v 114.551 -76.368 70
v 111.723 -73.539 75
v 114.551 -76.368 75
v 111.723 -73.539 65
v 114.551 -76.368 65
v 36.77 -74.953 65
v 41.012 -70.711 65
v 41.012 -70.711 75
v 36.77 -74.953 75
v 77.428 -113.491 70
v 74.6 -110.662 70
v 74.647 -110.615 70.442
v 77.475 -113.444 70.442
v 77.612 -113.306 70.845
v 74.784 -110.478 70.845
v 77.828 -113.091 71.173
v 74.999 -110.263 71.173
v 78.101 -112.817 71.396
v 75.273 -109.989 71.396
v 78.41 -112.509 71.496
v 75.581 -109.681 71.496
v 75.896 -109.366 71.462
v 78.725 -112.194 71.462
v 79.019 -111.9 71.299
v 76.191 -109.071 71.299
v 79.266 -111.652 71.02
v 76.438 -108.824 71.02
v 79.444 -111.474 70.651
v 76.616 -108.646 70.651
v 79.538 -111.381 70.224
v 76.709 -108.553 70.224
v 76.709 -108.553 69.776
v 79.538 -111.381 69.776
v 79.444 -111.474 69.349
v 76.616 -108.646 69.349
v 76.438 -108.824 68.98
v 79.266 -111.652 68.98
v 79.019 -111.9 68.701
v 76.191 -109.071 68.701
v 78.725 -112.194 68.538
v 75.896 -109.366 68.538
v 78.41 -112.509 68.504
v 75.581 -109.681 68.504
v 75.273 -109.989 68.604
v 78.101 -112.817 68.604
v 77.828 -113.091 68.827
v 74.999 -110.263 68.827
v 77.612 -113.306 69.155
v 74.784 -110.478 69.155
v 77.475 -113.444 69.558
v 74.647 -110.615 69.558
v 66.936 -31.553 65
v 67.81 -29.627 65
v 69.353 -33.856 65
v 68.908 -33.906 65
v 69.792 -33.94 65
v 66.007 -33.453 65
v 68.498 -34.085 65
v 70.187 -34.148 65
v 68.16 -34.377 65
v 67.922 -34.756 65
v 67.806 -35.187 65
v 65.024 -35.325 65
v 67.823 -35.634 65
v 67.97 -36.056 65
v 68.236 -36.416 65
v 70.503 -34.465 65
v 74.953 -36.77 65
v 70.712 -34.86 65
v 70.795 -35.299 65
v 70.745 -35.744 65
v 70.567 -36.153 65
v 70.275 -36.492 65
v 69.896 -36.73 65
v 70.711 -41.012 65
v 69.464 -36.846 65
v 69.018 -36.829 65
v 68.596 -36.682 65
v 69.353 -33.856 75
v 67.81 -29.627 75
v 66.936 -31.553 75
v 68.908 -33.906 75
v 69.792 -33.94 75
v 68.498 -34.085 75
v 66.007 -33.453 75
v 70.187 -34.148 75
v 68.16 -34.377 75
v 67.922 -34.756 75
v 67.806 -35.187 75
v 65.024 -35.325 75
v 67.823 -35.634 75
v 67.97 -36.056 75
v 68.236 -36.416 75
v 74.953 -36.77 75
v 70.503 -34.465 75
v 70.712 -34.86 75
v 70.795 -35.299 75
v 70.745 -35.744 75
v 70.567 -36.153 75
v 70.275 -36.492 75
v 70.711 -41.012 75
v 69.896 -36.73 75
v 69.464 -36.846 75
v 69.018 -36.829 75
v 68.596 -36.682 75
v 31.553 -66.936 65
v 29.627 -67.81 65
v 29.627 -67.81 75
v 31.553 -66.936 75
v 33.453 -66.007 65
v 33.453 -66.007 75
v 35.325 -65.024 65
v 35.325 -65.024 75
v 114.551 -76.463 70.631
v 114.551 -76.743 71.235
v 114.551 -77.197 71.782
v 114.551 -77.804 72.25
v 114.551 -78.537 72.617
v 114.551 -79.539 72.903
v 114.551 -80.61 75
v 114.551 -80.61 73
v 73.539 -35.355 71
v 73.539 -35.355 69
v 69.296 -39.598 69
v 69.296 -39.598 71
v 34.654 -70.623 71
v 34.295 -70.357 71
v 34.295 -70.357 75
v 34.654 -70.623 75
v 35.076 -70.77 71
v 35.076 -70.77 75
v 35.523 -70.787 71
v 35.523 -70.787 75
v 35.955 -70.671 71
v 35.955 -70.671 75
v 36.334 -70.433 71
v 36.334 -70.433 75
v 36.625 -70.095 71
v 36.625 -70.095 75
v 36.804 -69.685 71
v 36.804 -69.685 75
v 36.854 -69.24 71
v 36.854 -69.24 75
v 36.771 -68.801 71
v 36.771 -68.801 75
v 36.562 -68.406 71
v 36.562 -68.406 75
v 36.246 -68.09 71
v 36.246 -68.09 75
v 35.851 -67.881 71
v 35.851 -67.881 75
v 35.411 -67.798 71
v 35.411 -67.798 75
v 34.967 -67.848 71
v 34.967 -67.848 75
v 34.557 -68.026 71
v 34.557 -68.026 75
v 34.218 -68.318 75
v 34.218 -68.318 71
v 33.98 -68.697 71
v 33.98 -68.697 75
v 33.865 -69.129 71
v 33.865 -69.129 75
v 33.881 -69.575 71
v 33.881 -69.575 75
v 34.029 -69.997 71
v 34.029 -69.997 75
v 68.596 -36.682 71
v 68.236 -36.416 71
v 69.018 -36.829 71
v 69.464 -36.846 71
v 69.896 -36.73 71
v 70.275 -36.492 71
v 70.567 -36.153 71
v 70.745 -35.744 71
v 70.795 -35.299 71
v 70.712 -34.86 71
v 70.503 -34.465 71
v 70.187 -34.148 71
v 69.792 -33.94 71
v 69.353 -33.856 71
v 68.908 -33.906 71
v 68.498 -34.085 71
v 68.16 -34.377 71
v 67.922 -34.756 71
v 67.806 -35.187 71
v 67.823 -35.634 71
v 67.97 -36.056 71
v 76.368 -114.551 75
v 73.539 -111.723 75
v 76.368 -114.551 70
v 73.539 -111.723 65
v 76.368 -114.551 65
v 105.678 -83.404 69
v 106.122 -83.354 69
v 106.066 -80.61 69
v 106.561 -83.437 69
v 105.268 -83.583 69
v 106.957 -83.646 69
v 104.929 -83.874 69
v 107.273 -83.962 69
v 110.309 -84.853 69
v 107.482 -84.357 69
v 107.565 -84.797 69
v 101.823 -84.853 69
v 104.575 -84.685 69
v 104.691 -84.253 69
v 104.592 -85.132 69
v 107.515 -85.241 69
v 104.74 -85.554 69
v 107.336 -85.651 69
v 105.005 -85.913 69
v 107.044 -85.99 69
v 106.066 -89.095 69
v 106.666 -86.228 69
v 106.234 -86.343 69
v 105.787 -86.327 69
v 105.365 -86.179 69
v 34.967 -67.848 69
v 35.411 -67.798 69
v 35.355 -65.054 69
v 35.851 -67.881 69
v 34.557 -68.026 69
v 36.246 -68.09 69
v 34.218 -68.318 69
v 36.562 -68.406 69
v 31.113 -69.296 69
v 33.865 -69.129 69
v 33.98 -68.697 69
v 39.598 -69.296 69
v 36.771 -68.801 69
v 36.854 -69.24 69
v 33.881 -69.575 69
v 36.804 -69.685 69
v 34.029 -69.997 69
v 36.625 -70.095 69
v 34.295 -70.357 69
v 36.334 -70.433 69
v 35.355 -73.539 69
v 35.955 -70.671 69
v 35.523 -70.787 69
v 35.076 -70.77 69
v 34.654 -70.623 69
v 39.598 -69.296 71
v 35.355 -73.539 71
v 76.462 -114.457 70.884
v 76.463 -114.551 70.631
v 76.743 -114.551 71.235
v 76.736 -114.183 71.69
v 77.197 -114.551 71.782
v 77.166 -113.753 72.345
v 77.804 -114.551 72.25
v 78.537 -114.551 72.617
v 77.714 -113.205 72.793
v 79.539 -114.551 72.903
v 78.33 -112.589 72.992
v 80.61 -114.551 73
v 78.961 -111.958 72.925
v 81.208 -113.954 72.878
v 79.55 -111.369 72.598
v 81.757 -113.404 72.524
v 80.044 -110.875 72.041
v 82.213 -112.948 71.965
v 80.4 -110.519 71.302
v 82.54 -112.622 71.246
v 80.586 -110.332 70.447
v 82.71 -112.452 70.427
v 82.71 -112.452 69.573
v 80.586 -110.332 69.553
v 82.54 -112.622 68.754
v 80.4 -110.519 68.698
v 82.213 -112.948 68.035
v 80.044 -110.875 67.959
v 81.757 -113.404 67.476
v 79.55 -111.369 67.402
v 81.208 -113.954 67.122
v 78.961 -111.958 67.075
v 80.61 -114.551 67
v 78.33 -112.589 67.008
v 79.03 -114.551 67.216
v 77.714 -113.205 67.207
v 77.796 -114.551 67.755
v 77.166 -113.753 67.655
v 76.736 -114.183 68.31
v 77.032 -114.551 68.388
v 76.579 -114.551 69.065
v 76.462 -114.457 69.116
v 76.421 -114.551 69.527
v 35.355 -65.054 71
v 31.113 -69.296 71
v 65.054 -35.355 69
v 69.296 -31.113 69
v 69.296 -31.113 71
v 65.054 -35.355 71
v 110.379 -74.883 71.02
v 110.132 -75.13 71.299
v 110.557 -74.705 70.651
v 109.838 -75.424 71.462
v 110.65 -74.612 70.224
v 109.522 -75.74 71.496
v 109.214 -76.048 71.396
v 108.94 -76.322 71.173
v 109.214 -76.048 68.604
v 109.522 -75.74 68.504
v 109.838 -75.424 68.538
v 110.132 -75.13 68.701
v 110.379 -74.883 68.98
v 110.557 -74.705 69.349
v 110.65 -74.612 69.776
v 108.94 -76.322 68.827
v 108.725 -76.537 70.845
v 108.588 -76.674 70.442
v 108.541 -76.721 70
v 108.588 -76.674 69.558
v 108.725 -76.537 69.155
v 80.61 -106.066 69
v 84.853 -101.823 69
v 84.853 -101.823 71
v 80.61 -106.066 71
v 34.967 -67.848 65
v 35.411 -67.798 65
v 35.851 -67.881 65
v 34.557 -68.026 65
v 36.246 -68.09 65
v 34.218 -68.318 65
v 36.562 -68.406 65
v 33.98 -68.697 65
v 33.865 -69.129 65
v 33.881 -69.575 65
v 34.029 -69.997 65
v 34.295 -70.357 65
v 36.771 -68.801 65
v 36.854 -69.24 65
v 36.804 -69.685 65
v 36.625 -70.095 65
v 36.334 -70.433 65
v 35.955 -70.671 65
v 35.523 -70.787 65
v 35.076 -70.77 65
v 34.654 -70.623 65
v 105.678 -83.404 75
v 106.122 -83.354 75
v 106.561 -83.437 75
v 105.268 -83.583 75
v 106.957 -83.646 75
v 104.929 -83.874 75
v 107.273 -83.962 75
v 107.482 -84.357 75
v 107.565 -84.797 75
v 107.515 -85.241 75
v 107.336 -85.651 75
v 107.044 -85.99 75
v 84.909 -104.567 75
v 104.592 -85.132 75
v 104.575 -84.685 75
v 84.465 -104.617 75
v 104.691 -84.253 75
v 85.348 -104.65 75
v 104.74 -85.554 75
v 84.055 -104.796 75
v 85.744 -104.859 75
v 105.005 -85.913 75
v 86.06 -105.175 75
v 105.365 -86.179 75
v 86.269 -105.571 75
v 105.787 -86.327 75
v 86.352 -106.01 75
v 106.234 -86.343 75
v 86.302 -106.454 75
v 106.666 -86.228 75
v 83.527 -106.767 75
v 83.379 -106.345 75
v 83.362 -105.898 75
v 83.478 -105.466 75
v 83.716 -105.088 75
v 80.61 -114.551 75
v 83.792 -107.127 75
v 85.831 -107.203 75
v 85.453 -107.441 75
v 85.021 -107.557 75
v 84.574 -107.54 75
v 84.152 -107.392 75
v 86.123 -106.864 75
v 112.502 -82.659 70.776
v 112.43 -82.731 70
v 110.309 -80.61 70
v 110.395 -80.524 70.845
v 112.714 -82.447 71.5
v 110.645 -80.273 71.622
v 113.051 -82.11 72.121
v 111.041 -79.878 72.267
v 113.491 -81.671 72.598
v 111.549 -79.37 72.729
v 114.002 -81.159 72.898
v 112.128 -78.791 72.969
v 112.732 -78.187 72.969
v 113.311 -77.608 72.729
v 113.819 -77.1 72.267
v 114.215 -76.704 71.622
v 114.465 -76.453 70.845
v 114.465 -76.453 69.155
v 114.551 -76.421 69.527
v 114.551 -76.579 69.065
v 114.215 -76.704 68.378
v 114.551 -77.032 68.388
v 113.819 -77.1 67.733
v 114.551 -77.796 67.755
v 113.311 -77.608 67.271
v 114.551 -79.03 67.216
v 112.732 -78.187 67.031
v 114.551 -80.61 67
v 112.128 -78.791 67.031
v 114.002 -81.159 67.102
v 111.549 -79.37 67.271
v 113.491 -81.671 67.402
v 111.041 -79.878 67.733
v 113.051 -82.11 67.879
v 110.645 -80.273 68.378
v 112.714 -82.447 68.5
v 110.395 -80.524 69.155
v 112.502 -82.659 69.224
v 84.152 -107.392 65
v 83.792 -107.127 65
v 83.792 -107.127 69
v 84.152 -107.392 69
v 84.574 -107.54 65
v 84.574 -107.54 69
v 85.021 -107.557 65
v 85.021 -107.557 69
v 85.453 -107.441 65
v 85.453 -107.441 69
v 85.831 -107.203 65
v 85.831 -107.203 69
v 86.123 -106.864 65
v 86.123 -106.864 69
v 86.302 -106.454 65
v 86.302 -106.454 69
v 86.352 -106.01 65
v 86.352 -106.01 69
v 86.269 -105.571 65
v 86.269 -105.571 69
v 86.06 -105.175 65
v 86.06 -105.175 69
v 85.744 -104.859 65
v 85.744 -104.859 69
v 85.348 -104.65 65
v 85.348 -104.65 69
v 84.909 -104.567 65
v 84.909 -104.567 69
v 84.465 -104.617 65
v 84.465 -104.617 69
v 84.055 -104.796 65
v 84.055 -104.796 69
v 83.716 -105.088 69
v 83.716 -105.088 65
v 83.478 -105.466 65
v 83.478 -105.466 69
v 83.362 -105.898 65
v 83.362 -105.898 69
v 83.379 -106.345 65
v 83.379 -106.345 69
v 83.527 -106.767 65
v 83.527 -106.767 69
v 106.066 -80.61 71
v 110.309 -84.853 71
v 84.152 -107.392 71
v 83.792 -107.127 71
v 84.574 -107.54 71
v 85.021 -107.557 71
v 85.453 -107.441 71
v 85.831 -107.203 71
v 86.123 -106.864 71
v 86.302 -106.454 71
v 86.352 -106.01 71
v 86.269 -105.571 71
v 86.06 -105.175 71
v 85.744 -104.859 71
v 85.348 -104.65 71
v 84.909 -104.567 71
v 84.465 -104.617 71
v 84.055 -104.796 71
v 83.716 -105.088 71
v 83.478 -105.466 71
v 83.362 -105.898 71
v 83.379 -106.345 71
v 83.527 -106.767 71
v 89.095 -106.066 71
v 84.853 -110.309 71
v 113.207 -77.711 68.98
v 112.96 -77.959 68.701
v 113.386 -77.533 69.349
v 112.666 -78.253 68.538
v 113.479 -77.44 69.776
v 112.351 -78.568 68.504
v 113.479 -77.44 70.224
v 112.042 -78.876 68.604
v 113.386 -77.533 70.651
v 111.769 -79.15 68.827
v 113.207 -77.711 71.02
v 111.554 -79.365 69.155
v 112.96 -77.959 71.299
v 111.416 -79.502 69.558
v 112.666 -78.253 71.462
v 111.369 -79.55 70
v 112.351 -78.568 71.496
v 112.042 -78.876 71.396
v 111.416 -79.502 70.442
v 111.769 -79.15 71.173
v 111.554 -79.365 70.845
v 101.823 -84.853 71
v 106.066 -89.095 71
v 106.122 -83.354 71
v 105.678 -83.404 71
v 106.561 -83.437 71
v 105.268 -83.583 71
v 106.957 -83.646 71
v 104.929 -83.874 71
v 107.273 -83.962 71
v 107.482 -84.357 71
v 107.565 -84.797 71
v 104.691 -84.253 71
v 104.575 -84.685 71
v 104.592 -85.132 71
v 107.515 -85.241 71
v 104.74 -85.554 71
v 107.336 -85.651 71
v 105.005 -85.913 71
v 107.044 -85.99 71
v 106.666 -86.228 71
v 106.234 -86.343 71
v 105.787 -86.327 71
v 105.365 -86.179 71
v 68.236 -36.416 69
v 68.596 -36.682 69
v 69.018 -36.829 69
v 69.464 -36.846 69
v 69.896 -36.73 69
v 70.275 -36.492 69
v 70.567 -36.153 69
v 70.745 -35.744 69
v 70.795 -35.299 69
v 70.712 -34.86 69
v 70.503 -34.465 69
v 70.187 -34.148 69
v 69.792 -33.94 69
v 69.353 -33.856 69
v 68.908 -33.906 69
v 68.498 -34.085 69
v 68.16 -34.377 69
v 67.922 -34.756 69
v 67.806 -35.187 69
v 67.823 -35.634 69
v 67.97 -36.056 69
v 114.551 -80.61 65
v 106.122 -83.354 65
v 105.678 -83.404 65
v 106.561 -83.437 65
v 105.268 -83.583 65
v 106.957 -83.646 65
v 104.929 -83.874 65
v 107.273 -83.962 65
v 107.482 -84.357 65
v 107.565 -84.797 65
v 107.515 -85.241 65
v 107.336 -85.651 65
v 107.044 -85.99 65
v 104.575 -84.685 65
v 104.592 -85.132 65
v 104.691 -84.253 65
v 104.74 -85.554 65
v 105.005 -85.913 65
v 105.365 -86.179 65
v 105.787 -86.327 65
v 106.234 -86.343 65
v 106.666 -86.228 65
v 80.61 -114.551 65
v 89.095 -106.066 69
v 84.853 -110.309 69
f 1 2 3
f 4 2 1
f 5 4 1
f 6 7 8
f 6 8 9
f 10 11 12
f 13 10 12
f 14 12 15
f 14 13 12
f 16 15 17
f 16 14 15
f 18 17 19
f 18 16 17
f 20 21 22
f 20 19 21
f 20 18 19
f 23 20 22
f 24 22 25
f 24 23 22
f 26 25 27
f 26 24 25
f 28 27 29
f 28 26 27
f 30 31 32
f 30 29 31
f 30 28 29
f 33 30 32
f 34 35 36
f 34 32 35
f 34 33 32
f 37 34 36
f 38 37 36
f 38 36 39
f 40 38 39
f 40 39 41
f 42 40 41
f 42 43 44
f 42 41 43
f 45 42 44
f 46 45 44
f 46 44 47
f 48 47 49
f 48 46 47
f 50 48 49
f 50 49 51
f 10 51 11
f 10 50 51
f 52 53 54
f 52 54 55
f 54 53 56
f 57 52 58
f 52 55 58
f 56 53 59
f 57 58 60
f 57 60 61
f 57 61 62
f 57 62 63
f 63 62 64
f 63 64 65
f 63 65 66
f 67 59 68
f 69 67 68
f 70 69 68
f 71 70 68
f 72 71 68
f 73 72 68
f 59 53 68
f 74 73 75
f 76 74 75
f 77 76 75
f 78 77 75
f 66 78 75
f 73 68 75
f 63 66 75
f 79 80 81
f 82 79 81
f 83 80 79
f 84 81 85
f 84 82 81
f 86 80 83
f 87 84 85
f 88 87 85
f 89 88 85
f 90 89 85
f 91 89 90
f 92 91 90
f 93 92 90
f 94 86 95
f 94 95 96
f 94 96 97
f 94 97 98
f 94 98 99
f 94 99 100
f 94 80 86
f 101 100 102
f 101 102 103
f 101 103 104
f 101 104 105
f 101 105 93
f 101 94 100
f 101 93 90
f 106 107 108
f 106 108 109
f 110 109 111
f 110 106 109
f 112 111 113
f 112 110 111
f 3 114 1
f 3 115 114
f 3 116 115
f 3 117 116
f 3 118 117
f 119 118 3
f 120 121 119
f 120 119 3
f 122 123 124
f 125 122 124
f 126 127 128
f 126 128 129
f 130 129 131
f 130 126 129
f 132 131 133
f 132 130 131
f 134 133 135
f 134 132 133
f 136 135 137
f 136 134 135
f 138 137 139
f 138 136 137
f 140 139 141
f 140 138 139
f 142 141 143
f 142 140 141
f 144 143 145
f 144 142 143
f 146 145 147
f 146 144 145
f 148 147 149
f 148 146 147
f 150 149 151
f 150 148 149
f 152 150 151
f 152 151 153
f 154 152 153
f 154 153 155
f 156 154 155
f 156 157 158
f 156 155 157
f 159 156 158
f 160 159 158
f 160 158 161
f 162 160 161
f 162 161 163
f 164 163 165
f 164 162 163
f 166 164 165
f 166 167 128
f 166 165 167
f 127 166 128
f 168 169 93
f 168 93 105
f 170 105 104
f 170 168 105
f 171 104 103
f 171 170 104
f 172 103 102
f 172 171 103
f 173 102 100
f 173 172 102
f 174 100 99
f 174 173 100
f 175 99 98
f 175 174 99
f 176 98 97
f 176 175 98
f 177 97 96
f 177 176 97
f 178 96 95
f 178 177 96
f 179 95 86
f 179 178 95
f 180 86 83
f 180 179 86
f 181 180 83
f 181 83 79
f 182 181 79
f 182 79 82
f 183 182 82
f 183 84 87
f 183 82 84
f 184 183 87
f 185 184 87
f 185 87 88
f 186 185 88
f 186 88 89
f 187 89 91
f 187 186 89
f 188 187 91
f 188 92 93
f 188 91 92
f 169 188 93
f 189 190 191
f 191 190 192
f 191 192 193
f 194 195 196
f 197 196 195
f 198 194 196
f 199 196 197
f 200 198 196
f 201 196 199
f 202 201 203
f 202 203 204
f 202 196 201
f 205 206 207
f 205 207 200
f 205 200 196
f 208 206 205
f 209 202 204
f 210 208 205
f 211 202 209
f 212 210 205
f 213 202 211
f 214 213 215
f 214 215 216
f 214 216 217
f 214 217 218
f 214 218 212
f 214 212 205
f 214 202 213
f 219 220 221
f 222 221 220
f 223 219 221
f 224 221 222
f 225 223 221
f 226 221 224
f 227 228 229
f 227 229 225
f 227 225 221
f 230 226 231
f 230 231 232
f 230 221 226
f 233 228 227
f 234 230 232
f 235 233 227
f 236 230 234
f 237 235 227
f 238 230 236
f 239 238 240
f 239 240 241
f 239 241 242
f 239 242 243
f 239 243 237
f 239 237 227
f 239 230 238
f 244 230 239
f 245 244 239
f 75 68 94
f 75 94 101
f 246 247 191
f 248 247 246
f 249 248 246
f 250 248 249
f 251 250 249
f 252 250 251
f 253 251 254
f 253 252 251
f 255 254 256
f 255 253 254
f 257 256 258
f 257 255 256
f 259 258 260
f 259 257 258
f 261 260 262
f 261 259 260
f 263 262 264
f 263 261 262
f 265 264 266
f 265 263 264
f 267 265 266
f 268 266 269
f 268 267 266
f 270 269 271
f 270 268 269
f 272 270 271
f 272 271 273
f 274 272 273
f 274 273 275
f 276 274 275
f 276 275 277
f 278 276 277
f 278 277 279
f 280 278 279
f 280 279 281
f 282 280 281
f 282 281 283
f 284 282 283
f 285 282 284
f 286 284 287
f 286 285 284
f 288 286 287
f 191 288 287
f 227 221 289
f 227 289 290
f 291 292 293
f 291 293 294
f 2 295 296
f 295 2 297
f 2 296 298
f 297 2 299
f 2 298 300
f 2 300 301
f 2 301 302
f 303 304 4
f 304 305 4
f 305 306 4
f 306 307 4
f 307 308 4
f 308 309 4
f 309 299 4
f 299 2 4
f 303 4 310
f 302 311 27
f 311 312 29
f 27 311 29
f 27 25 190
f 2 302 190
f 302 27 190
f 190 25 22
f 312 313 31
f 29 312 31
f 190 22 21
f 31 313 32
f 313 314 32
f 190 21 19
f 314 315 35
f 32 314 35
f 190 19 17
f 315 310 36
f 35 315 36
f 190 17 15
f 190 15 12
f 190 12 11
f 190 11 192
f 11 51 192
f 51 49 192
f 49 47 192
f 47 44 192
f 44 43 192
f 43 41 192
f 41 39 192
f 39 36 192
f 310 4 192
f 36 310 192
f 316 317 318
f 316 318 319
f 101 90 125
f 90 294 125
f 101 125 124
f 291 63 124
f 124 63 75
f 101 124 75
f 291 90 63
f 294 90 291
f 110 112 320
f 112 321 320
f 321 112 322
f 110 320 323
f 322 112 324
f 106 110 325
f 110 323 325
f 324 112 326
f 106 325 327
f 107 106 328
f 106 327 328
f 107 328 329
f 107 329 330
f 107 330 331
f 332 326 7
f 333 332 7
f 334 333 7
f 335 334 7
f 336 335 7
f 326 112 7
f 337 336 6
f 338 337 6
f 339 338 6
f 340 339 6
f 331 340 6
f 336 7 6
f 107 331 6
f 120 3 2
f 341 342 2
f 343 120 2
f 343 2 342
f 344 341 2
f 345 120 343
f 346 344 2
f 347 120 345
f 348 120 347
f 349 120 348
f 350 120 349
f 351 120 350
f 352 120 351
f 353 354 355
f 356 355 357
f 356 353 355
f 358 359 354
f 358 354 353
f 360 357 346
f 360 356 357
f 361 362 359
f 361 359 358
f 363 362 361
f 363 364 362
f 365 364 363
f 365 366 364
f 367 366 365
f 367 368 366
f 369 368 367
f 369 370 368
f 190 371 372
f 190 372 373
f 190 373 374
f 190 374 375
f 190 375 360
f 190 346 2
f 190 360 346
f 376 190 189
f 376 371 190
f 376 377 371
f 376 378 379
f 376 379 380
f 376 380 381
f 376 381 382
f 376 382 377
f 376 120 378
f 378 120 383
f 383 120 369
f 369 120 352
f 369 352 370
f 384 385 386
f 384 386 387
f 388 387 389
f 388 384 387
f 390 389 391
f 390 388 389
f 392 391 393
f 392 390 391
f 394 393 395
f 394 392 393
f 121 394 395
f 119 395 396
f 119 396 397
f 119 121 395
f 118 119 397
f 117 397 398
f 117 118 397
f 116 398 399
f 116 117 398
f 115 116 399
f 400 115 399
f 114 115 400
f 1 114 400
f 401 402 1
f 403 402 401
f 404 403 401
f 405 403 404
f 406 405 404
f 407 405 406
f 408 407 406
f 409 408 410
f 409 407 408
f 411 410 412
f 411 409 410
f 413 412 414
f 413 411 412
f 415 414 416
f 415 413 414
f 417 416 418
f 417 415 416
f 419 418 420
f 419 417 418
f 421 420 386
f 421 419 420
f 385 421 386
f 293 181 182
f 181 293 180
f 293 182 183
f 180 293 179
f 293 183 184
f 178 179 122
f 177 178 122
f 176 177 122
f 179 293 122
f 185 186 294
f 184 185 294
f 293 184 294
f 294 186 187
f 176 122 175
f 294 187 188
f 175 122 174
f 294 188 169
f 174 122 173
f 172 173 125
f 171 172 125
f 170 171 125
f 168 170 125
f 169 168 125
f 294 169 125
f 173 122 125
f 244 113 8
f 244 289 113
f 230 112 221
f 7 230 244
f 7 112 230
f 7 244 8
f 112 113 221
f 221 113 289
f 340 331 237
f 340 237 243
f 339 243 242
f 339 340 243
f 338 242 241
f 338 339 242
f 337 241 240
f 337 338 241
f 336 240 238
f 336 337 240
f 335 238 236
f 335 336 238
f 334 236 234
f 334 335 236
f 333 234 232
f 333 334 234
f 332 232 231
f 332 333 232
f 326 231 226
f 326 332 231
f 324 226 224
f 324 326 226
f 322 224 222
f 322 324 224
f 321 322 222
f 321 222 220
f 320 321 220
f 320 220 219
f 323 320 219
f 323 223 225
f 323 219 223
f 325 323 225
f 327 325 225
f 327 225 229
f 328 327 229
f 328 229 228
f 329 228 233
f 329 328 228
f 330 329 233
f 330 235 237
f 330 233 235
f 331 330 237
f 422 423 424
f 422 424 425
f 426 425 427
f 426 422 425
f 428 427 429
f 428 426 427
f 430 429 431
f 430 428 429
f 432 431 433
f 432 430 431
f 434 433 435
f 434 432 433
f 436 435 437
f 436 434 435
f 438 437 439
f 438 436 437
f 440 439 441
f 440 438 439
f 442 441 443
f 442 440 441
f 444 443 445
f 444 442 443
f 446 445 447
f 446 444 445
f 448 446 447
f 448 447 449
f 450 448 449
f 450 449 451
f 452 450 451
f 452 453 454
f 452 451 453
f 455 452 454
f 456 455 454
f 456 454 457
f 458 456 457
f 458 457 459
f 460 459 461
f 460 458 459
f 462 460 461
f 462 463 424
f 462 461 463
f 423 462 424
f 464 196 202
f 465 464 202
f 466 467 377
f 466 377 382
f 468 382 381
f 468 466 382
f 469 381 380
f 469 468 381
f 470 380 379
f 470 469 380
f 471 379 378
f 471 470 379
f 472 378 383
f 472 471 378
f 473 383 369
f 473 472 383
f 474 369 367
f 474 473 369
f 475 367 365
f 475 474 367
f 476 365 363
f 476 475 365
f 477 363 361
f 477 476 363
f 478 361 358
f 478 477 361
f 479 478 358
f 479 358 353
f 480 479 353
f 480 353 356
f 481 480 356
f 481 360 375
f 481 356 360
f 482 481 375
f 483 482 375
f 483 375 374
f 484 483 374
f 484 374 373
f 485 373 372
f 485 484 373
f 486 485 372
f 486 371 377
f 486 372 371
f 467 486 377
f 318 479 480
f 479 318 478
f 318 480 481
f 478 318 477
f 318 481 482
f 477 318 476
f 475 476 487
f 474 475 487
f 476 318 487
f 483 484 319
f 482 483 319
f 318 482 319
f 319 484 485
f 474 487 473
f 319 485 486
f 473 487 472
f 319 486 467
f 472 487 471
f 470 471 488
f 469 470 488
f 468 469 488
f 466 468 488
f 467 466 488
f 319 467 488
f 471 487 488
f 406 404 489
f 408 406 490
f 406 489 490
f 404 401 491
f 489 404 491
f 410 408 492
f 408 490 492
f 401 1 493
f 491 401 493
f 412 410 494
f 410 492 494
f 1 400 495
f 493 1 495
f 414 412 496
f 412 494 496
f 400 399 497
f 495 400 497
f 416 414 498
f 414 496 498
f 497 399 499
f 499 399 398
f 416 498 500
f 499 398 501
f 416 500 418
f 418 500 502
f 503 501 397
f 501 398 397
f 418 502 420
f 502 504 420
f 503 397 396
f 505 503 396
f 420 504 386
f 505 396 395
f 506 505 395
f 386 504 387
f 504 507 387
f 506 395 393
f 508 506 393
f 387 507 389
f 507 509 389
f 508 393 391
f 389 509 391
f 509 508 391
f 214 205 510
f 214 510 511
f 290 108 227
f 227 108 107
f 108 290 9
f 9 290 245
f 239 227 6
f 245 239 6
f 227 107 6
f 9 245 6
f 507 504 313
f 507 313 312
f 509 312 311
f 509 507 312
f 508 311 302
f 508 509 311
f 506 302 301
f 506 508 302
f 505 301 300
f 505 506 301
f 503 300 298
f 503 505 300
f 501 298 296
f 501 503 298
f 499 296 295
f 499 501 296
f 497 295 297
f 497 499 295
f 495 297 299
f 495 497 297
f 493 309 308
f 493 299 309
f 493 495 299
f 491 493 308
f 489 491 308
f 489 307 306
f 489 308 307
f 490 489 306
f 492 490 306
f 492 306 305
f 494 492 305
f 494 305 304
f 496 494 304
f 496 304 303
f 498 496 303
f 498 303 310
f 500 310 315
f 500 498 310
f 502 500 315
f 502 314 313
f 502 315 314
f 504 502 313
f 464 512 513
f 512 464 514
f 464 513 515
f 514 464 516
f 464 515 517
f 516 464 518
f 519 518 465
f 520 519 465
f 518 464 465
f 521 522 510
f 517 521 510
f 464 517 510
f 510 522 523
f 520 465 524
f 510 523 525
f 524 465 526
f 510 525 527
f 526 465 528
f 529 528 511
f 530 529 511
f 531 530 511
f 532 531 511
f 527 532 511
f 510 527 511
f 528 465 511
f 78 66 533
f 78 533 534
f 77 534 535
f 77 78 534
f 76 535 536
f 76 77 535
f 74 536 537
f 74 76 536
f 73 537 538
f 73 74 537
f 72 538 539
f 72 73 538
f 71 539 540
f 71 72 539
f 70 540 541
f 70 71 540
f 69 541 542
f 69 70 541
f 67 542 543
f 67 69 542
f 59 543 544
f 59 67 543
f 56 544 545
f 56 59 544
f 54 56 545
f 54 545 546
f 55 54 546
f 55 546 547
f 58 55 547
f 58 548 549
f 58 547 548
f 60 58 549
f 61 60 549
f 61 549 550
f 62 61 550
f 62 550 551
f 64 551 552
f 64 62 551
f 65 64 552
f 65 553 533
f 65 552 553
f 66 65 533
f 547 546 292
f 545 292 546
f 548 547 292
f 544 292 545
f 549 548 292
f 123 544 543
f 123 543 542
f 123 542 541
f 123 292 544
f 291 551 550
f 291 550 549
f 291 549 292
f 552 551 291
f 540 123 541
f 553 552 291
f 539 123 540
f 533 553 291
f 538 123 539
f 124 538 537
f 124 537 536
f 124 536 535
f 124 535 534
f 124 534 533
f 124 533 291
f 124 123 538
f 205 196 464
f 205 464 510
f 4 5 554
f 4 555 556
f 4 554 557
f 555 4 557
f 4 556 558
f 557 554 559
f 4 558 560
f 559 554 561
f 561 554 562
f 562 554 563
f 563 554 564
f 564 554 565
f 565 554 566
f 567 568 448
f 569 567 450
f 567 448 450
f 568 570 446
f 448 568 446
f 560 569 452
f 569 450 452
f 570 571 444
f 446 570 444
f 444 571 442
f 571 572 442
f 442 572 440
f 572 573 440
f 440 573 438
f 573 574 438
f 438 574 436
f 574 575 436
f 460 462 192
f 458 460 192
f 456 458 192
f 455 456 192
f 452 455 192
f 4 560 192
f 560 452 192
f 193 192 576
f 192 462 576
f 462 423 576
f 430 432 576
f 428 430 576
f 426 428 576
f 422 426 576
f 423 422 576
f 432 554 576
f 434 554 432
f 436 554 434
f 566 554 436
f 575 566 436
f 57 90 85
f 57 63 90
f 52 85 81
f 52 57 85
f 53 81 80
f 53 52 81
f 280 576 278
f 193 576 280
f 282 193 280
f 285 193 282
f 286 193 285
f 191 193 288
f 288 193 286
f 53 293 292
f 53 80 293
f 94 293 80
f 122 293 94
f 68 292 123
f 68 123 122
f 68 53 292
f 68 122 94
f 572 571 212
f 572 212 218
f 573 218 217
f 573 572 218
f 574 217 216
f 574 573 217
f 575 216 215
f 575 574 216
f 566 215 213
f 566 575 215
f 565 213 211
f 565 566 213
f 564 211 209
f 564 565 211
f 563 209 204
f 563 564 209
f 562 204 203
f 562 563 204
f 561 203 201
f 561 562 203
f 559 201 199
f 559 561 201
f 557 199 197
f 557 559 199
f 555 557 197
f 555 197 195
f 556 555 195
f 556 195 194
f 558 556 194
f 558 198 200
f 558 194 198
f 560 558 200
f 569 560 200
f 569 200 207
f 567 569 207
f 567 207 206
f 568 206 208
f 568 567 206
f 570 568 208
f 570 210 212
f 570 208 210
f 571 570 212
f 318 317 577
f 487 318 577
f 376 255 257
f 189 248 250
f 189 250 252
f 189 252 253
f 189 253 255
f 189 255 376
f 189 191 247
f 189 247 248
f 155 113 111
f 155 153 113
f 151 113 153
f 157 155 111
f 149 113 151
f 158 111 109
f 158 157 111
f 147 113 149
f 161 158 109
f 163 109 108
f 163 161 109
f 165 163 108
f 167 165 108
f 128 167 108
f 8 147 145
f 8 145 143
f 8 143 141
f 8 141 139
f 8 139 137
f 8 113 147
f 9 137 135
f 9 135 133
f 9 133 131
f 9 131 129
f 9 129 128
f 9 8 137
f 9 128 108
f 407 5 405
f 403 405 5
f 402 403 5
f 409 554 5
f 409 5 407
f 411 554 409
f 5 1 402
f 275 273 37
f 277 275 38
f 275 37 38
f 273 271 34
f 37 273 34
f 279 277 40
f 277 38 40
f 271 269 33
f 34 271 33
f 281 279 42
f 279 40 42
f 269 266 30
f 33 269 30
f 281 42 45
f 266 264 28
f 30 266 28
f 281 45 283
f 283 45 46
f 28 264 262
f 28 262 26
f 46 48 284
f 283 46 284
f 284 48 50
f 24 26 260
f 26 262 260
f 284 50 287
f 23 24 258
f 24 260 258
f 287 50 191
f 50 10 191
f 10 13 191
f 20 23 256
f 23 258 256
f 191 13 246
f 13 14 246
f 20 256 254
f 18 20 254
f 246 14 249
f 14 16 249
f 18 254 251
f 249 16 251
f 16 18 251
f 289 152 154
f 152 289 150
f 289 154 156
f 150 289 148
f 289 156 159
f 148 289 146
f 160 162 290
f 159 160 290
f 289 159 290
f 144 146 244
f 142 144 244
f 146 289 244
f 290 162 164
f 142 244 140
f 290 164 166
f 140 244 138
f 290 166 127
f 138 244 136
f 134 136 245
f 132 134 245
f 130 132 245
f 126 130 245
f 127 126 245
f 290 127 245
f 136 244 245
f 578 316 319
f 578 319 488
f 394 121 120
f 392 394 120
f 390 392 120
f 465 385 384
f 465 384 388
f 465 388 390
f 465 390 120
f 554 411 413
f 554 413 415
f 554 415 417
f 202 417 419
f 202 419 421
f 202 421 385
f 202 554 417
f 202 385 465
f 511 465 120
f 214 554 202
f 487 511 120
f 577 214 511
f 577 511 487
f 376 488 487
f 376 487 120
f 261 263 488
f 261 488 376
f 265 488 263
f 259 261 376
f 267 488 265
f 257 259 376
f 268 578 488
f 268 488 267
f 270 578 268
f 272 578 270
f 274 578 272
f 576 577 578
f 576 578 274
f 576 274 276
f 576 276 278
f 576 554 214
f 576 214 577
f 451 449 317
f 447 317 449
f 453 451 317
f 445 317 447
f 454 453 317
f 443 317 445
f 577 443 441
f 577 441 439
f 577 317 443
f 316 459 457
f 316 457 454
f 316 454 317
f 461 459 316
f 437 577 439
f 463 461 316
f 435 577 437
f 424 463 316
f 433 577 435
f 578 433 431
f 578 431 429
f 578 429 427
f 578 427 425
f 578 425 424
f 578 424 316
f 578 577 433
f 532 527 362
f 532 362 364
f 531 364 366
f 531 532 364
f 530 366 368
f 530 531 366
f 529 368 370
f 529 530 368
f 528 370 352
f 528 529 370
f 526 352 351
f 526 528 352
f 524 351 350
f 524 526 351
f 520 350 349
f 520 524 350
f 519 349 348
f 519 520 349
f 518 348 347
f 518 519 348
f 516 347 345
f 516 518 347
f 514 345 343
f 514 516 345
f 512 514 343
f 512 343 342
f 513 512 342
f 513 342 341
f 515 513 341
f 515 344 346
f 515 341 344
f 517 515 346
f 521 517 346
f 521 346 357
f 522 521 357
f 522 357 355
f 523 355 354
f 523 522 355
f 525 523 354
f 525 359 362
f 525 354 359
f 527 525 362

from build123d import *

# Parameters (mm, degrees)
CYLINDER2001_R               = 1.5
CYLINDER2001_DEPTH           = 60
CYLINDER1998_R               = 1.5
CYLINDER1998_DEPTH           = 60
CYLINDER1999_R               = 1.5
CYLINDER1999_DEPTH           = 60
CYLINDER2000_R               = 1.5
CYLINDER2000_DEPTH           = 60
COMPOUND1080_PLACEMENT_ANGLE = 225
CYLINDER1762_R               = 1.5
CYLINDER1762_DEPTH           = 50
COMPOUND894_PLACEMENT_ANGLE  = 225
CYLINDER1761_R               = 1.5
CYLINDER1761_DEPTH           = 50
COMPOUND893_PLACEMENT_ANGLE  = 225
CYLINDER1764_R               = 3
CYLINDER1764_DEPTH           = 3
COMPOUND897_PLACEMENT_ANGLE  = 225
CYLINDER1763_R               = 3
CYLINDER1763_DEPTH           = 3
COMPOUND896_PLACEMENT_ANGLE  = 225
BOX716_W                     = 6
BOX716_H                     = 6
BOX716_DEPTH                 = 2
BOX714_W                     = 6
BOX714_H                     = 6
BOX714_DEPTH                 = 2
BOX717_W                     = 6
BOX717_H                     = 6
BOX717_DEPTH                 = 2
BOX715_W                     = 6
BOX715_H                     = 6
BOX715_DEPTH                 = 2
COMPOUND899_PLACEMENT_ANGLE  = 225
CYLINDER1760_R               = 74
CYLINDER1760_DEPTH           = 40
BOX713_W                     = 42
BOX713_H                     = 62
BOX713_DEPTH                 = 50
COMPOUND892_PLACEMENT_ANGLE  = 225
BOX712_W                     = 56
BOX712_H                     = 52
BOX712_DEPTH                 = 10
COMPOUND891_PLACEMENT_ANGLE  = 225
BOX711_W                     = 54
BOX711_H                     = 70
BOX711_DEPTH                 = 10
COMPOUND890_PLACEMENT_ANGLE  = 225
CHAMFER_SIZE                 = 3


with BuildPart() as v_lec2001:
    # Cylinder2001 → Cylinder2001 (new body)
    with BuildSketch(Plane(origin=(-24, 74, -80), x_dir=(1, 0, 0), z_dir=(0, 0, 1))):
        Circle(CYLINDER2001_R)
    extrude(amount=CYLINDER2001_DEPTH)


with BuildPart() as v_lec1998:
    # Cylinder1998 → Cylinder1998 (new body)
    with BuildSketch(Plane(origin=(-15, 135, -80), x_dir=(1, 0, 0), z_dir=(0, 0, 1))):
        Circle(CYLINDER1998_R)
    extrude(amount=CYLINDER1998_DEPTH)


with BuildPart() as v_lec1999:
    # Cylinder1999 → Cylinder1999 (new body)
    with BuildSketch(Plane(origin=(15, 135, -80), x_dir=(1, 0, 0), z_dir=(0, 0, 1))):
        Circle(CYLINDER1999_R)
    extrude(amount=CYLINDER1999_DEPTH)


with BuildPart() as compound1080:
    # Cylinder2000 → Cylinder2000 (new body)
    with BuildSketch(Plane(origin=(24, 74, -80), x_dir=(1, 0, 0), z_dir=(0, 0, 1))):
        Circle(CYLINDER2000_R)
    extrude(amount=CYLINDER2000_DEPTH)

    # Compound1080: union Válec2001, Válec1998, Válec1999
    add(v_lec2001.part)
    add(v_lec1998.part)
    add(v_lec1999.part)


with BuildPart() as compound1080_1:
    # Compound1080 placement: moved
    add(compound1080.part.moved(Location((0, 0, 100))).rotate(Axis((0, 0, 100), (0, 0, 1)), COMPOUND1080_PLACEMENT_ANGLE))


with BuildPart() as compound894:
    # Cylinder1762 → Cylinder1762 (new body)
    with BuildSketch(Plane(origin=(24, 140, 72), x_dir=(1, 0, 0), z_dir=(0, -1, 0))):
        Circle(CYLINDER1762_R)
    extrude(amount=CYLINDER1762_DEPTH)


with BuildPart() as compound894_1:
    # Compound894 placement: moved
    add(compound894.part.rotate(Axis((0, 0, 0), (0, 0, 1)), COMPOUND894_PLACEMENT_ANGLE))


with BuildPart() as compound895:
    # Cylinder1761 → Cylinder1761 (new body)
    with BuildSketch(Plane(origin=(-24, 140, 72), x_dir=(1, 0, 0), z_dir=(0, -1, 0))):
        Circle(CYLINDER1761_R)
    extrude(amount=CYLINDER1761_DEPTH)


with BuildPart() as compound895_1:
    # Compound893 placement: moved
    add(compound895.part.rotate(Axis((0, 0, 0), (0, 0, 1)), COMPOUND893_PLACEMENT_ANGLE))

    # Compound895: union Compound894
    add(compound894_1.part)


with BuildPart() as compound895_2:
    # Compound895 placement: moved
    add(compound895_1.part.moved(Location((0, 0, -2))))


with BuildPart() as compound897:
    # Cylinder1764 → Cylinder1764 (new body)
    with BuildSketch(Plane(origin=(24, 138, 72), x_dir=(1, 0, 0), z_dir=(0, -1, 0))):
        Circle(CYLINDER1764_R)
    extrude(amount=CYLINDER1764_DEPTH)


with BuildPart() as compound897_1:
    # Compound897 placement: moved
    add(compound897.part.rotate(Axis((0, 0, 0), (0, 0, 1)), COMPOUND897_PLACEMENT_ANGLE))


with BuildPart() as compound898:
    # Cylinder1763 → Cylinder1763 (new body)
    with BuildSketch(Plane(origin=(-24, 138, 72), x_dir=(1, 0, 0), z_dir=(0, -1, 0))):
        Circle(CYLINDER1763_R)
    extrude(amount=CYLINDER1763_DEPTH)


with BuildPart() as compound898_1:
    # Compound896 placement: moved
    add(compound898.part.rotate(Axis((0, 0, 0), (0, 0, 1)), COMPOUND896_PLACEMENT_ANGLE))

    # Compound898: union Compound897
    add(compound897_1.part)


with BuildPart() as compound898_2:
    # Compound898 placement: moved
    add(compound898_1.part.moved(Location((0, 0, -2))))


with BuildPart() as krychle716:
    # Box716 → Box716 (new body)
    with BuildSketch(Plane(origin=(-18, 132, -48), x_dir=(1, 0, 0), z_dir=(0, 0, 1))):
        with Locations((3, 3)):
            Rectangle(BOX716_W, BOX716_H)
    extrude(amount=BOX716_DEPTH)


with BuildPart() as krychle714:
    # Box714 → Box714 (new body)
    with BuildSketch(Plane(origin=(21, 71, -48), x_dir=(1, 0, 0), z_dir=(0, 0, 1))):
        with Locations((3, 3)):
            Rectangle(BOX714_W, BOX714_H)
    extrude(amount=BOX714_DEPTH)


with BuildPart() as krychle717:
    # Box717 → Box717 (new body)
    with BuildSketch(Plane(origin=(12, 132, -48), x_dir=(1, 0, 0), z_dir=(0, 0, 1))):
        with Locations((3, 3)):
            Rectangle(BOX717_W, BOX717_H)
    extrude(amount=BOX717_DEPTH)


with BuildPart() as compound899:
    # Box715 → Box715 (new body)
    with BuildSketch(Plane(origin=(-27, 71, -48), x_dir=(1, 0, 0), z_dir=(0, 0, 1))):
        with Locations((3, 3)):
            Rectangle(BOX715_W, BOX715_H)
    extrude(amount=BOX715_DEPTH)

    # Compound899: union Krychle716, Krychle714, Krychle717
    add(krychle716.part)
    add(krychle714.part)
    add(krychle717.part)


with BuildPart() as compound899_1:
    # Compound899 placement: moved
    add(compound899.part.moved(Location((0, 0, 117))).rotate(Axis((0, 0, 117), (0, 0, 1)), COMPOUND899_PLACEMENT_ANGLE))


with BuildPart() as v_lec1760:
    # Cylinder1760 → Cylinder1760 (new body)
    with BuildSketch(Plane.XY.offset(44)):
        Circle(CYLINDER1760_R)
    extrude(amount=CYLINDER1760_DEPTH)


with BuildPart() as compound892:
    # Box713 → Box713 (new body)
    with BuildSketch(Plane(origin=(-21, 62, 31), x_dir=(1, 0, 0), z_dir=(0, 0, 1))):
        with Locations((21, 31)):
            Rectangle(BOX713_W, BOX713_H)
    extrude(amount=BOX713_DEPTH)


with BuildPart() as compound892_1:
    # Compound892 placement: moved
    add(compound892.part.rotate(Axis((0, 0, 0), (0, 0, 1)), COMPOUND892_PLACEMENT_ANGLE))


with BuildPart() as compound891:
    # Box712 → Box712 (new body)
    with BuildSketch(Plane(origin=(-28, 79, 75), x_dir=(1, 0, 0), z_dir=(0, 0, 1))):
        with Locations((28, 26)):
            Rectangle(BOX712_W, BOX712_H)
    extrude(amount=BOX712_DEPTH)


with BuildPart() as compound891_1:
    # Compound891 placement: moved
    add(compound891.part.moved(Location((0, 0, -10))).rotate(Axis((0, 0, -10), (0, 0, 1)), COMPOUND891_PLACEMENT_ANGLE))


with BuildPart() as cut674:
    # Box711 → Box711 (new body)
    with BuildSketch(Plane(origin=(-27, 68, 75), x_dir=(1, 0, 0), z_dir=(0, 0, 1))):
        with Locations((27, 35)):
            Rectangle(BOX711_W, BOX711_H)
    extrude(amount=BOX711_DEPTH)


with BuildPart() as cut674_1:
    # Compound890 placement: moved
    add(cut674.part.moved(Location((0, 0, -10))).rotate(Axis((0, 0, -10), (0, 0, 1)), COMPOUND890_PLACEMENT_ANGLE))

    # Cut522: cut Compound891
    add(compound891_1.part, mode=Mode.SUBTRACT)

    # Cut523: cut Compound892
    add(compound892_1.part, mode=Mode.SUBTRACT)

    # Cut524: cut Válec1760
    add(v_lec1760.part, mode=Mode.SUBTRACT)

    # Cut528: cut Compound899
    add(compound899_1.part, mode=Mode.SUBTRACT)

    # Chamfer
    chamfer_edges = [cut674_1.edges().sort_by_distance(p)[0] for p in [
        (116.672619, -78.488853, 70),
        (78.488853, -116.672619, 70),
    ]]
    chamfer(chamfer_edges, length=CHAMFER_SIZE)

    # Cut529: cut Compound898
    add(compound898_2.part, mode=Mode.SUBTRACT)

    # Cut530: cut Compound895
    add(compound895_2.part, mode=Mode.SUBTRACT)

    # Cut674: cut Compound1080
    add(compound1080_1.part, mode=Mode.SUBTRACT)


solid = cut674_1.part
